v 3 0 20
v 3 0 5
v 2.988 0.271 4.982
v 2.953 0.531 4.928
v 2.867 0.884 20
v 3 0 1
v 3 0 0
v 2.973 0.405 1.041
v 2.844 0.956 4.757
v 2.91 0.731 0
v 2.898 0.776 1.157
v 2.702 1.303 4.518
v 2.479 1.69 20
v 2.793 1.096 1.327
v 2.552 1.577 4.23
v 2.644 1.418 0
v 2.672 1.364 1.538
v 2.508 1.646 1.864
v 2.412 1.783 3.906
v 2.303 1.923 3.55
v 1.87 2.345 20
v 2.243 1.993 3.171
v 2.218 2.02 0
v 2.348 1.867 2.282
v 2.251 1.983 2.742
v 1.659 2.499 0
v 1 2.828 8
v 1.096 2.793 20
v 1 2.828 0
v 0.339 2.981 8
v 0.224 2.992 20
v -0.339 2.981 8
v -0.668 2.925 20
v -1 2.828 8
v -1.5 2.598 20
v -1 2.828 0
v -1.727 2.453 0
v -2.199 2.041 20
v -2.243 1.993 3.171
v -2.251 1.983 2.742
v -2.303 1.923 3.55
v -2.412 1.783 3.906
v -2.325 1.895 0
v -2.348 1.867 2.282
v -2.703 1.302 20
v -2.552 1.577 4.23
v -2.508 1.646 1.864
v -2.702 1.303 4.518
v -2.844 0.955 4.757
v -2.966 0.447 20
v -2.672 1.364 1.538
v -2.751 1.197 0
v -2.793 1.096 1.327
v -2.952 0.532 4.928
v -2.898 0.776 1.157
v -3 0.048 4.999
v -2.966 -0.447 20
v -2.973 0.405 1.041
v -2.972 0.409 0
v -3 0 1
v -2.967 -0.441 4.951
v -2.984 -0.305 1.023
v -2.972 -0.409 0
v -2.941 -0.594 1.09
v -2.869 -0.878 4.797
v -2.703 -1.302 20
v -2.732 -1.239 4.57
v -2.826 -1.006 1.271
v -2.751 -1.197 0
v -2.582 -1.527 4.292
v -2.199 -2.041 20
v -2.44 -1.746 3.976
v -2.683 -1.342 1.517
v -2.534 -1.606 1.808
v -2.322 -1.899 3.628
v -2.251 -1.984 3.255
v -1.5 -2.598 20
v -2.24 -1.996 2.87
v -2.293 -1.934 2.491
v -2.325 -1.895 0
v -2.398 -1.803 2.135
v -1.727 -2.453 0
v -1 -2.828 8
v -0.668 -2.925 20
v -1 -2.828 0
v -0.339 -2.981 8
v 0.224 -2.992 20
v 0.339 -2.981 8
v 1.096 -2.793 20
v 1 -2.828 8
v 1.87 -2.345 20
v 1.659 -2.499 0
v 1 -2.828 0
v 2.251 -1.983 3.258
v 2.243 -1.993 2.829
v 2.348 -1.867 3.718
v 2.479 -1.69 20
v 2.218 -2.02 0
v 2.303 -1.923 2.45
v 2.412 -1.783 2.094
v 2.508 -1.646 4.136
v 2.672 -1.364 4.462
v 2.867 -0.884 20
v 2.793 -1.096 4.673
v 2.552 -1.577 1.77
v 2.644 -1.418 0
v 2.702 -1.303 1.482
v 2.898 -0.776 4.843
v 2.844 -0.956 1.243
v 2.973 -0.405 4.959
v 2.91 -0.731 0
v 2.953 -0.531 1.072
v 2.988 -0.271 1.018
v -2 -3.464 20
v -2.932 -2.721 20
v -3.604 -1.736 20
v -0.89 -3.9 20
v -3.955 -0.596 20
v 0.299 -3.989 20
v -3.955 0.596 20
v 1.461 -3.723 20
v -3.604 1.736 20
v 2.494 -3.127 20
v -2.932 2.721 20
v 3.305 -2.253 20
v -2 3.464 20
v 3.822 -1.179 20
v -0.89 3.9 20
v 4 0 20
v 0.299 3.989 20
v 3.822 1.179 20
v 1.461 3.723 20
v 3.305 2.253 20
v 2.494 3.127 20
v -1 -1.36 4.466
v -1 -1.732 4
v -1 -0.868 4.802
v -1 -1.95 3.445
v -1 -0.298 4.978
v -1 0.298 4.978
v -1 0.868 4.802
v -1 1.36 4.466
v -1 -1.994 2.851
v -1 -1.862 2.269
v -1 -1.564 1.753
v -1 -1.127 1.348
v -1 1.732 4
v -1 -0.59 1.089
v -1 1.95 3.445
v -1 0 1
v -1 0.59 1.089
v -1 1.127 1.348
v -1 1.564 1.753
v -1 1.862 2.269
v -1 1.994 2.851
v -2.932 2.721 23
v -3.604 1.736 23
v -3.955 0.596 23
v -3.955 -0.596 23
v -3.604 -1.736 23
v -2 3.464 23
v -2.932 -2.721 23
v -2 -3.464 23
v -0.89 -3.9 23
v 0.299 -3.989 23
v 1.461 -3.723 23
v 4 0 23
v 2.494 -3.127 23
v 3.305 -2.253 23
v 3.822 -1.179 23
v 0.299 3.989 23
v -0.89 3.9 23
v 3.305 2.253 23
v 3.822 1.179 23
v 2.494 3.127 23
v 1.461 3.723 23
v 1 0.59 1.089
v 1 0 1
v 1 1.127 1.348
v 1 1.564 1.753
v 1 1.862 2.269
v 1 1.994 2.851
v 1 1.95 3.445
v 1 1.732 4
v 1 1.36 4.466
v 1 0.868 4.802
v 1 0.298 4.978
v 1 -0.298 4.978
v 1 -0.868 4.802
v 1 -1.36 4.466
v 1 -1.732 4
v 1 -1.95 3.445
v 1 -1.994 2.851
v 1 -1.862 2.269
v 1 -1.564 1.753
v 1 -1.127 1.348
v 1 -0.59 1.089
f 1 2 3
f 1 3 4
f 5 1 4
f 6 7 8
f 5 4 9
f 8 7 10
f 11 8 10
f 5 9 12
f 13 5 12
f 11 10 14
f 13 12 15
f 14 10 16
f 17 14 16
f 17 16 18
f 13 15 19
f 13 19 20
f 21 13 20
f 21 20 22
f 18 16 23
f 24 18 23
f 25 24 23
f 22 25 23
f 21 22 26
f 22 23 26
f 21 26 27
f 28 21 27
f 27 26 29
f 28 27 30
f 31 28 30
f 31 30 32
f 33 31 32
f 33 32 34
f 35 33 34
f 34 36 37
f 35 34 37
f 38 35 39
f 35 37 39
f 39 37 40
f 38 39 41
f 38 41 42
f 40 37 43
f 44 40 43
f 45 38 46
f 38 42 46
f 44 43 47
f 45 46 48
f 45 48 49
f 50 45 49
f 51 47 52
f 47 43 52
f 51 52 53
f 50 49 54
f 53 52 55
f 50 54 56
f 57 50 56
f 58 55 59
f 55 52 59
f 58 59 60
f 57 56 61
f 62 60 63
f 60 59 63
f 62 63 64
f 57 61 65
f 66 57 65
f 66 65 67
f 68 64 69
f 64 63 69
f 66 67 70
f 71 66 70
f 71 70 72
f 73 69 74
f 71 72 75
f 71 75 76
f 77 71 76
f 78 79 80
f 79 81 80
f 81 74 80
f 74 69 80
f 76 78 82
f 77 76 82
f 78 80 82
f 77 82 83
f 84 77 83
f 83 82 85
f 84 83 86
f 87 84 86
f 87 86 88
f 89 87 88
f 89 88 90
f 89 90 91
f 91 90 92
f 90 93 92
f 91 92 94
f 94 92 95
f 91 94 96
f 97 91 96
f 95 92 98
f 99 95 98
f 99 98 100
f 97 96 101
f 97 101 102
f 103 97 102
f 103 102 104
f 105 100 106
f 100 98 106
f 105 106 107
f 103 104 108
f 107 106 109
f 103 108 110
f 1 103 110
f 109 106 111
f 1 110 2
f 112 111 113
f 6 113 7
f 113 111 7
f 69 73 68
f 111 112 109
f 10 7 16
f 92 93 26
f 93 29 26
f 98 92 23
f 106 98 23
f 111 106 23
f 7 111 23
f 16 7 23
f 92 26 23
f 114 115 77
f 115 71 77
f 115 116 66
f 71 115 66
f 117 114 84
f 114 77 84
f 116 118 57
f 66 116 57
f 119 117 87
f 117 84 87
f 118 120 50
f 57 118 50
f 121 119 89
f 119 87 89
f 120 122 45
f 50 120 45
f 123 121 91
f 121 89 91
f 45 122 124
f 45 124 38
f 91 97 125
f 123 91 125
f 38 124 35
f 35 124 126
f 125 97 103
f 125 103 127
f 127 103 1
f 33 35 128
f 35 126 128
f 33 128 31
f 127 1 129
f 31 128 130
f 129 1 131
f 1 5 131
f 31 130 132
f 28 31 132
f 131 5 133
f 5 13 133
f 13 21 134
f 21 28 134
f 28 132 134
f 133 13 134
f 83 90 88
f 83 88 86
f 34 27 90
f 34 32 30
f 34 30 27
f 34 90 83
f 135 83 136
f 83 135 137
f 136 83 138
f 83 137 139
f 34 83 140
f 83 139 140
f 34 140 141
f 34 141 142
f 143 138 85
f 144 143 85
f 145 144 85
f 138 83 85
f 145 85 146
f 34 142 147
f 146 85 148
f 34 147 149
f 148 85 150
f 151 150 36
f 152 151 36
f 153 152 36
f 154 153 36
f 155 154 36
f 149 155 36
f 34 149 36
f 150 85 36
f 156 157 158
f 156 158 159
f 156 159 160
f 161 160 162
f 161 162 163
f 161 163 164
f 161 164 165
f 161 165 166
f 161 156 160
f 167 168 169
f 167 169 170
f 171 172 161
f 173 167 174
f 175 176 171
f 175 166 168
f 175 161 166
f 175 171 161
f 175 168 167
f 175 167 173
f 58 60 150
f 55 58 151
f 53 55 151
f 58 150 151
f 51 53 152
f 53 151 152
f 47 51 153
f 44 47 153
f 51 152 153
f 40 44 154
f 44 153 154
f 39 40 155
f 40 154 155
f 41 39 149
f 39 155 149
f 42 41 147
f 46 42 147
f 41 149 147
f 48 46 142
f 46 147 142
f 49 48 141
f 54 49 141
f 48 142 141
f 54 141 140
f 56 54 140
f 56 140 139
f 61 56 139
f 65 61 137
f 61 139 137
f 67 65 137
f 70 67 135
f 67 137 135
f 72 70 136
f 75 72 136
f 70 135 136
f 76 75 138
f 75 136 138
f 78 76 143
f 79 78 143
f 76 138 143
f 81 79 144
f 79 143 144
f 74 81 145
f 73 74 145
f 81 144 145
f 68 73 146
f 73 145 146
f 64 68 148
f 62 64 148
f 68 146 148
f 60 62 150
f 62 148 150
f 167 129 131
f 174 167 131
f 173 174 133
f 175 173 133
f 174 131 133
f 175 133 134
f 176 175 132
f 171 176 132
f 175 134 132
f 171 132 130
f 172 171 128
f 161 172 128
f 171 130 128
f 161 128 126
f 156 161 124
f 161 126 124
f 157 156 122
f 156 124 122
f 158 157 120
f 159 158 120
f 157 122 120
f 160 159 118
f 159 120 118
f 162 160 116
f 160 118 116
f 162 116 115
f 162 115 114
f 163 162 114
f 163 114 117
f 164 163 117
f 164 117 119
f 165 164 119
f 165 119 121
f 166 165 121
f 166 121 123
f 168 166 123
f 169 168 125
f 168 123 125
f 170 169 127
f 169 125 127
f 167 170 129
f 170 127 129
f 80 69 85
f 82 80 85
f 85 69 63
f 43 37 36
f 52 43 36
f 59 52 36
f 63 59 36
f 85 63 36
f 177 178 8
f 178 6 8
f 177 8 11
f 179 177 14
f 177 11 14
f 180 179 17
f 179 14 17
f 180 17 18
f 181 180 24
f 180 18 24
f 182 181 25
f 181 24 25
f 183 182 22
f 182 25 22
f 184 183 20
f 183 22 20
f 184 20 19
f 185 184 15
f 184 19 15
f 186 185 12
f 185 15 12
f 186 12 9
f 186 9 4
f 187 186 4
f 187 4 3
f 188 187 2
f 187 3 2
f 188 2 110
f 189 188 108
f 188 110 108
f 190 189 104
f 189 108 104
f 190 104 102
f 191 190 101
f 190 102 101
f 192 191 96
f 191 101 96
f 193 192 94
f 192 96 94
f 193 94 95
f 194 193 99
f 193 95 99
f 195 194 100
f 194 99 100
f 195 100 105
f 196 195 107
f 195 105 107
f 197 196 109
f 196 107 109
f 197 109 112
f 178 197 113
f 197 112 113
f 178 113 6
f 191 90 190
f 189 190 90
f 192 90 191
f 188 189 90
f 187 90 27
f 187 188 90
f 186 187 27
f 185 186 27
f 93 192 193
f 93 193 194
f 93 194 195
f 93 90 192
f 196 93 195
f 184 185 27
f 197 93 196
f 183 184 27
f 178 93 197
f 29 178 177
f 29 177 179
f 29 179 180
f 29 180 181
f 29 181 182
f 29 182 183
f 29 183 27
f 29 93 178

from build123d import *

# Parameters (mm, degrees)
SKETCH_1_R          = 3
EXTRUDE_1_DEPTH     = 20
SKETCH_2_R          = 4
EXTRUDE_2_DEPTH     = 3
SKETCH_4_W          = 2
SKETCH_4_H          = 6.835299346
CUT_EXTRUDE_1_DEPTH = 8
SKETCH_5_R          = 2
CUT_EXTRUDE_2_DEPTH = 4


with BuildPart() as part:
    # 草图1 → 凸台-拉伸1 (new body)
    with BuildSketch(Plane.XY):
        Circle(SKETCH_1_R)
    extrude(amount=EXTRUDE_1_DEPTH)

    # 草图2 → 凸台-拉伸2 (add)
    with BuildSketch(Plane.XY.offset(20)):
        Circle(SKETCH_2_R)
    extrude(amount=EXTRUDE_2_DEPTH)

    # 草图4 → 切除-拉伸1 (cut)
    with BuildSketch(Plane(origin=(0, 0, 0), x_dir=(-1, 0, 0), z_dir=(0, 0, -1))):
        Rectangle(SKETCH_4_W, SKETCH_4_H)
    extrude(amount=-CUT_EXTRUDE_1_DEPTH, mode=Mode.SUBTRACT)

    # 草图5 → 切除-拉伸2 (cut, symmetric)
    with BuildSketch(Plane(origin=(0, 0, 0), x_dir=(0, 0, -1), z_dir=(1, 0, 0))):
        with Locations((-3, 0)):
            Circle(SKETCH_5_R)
    extrude(amount=CUT_EXTRUDE_2_DEPTH, both=True, mode=Mode.SUBTRACT)


solid = part.part
